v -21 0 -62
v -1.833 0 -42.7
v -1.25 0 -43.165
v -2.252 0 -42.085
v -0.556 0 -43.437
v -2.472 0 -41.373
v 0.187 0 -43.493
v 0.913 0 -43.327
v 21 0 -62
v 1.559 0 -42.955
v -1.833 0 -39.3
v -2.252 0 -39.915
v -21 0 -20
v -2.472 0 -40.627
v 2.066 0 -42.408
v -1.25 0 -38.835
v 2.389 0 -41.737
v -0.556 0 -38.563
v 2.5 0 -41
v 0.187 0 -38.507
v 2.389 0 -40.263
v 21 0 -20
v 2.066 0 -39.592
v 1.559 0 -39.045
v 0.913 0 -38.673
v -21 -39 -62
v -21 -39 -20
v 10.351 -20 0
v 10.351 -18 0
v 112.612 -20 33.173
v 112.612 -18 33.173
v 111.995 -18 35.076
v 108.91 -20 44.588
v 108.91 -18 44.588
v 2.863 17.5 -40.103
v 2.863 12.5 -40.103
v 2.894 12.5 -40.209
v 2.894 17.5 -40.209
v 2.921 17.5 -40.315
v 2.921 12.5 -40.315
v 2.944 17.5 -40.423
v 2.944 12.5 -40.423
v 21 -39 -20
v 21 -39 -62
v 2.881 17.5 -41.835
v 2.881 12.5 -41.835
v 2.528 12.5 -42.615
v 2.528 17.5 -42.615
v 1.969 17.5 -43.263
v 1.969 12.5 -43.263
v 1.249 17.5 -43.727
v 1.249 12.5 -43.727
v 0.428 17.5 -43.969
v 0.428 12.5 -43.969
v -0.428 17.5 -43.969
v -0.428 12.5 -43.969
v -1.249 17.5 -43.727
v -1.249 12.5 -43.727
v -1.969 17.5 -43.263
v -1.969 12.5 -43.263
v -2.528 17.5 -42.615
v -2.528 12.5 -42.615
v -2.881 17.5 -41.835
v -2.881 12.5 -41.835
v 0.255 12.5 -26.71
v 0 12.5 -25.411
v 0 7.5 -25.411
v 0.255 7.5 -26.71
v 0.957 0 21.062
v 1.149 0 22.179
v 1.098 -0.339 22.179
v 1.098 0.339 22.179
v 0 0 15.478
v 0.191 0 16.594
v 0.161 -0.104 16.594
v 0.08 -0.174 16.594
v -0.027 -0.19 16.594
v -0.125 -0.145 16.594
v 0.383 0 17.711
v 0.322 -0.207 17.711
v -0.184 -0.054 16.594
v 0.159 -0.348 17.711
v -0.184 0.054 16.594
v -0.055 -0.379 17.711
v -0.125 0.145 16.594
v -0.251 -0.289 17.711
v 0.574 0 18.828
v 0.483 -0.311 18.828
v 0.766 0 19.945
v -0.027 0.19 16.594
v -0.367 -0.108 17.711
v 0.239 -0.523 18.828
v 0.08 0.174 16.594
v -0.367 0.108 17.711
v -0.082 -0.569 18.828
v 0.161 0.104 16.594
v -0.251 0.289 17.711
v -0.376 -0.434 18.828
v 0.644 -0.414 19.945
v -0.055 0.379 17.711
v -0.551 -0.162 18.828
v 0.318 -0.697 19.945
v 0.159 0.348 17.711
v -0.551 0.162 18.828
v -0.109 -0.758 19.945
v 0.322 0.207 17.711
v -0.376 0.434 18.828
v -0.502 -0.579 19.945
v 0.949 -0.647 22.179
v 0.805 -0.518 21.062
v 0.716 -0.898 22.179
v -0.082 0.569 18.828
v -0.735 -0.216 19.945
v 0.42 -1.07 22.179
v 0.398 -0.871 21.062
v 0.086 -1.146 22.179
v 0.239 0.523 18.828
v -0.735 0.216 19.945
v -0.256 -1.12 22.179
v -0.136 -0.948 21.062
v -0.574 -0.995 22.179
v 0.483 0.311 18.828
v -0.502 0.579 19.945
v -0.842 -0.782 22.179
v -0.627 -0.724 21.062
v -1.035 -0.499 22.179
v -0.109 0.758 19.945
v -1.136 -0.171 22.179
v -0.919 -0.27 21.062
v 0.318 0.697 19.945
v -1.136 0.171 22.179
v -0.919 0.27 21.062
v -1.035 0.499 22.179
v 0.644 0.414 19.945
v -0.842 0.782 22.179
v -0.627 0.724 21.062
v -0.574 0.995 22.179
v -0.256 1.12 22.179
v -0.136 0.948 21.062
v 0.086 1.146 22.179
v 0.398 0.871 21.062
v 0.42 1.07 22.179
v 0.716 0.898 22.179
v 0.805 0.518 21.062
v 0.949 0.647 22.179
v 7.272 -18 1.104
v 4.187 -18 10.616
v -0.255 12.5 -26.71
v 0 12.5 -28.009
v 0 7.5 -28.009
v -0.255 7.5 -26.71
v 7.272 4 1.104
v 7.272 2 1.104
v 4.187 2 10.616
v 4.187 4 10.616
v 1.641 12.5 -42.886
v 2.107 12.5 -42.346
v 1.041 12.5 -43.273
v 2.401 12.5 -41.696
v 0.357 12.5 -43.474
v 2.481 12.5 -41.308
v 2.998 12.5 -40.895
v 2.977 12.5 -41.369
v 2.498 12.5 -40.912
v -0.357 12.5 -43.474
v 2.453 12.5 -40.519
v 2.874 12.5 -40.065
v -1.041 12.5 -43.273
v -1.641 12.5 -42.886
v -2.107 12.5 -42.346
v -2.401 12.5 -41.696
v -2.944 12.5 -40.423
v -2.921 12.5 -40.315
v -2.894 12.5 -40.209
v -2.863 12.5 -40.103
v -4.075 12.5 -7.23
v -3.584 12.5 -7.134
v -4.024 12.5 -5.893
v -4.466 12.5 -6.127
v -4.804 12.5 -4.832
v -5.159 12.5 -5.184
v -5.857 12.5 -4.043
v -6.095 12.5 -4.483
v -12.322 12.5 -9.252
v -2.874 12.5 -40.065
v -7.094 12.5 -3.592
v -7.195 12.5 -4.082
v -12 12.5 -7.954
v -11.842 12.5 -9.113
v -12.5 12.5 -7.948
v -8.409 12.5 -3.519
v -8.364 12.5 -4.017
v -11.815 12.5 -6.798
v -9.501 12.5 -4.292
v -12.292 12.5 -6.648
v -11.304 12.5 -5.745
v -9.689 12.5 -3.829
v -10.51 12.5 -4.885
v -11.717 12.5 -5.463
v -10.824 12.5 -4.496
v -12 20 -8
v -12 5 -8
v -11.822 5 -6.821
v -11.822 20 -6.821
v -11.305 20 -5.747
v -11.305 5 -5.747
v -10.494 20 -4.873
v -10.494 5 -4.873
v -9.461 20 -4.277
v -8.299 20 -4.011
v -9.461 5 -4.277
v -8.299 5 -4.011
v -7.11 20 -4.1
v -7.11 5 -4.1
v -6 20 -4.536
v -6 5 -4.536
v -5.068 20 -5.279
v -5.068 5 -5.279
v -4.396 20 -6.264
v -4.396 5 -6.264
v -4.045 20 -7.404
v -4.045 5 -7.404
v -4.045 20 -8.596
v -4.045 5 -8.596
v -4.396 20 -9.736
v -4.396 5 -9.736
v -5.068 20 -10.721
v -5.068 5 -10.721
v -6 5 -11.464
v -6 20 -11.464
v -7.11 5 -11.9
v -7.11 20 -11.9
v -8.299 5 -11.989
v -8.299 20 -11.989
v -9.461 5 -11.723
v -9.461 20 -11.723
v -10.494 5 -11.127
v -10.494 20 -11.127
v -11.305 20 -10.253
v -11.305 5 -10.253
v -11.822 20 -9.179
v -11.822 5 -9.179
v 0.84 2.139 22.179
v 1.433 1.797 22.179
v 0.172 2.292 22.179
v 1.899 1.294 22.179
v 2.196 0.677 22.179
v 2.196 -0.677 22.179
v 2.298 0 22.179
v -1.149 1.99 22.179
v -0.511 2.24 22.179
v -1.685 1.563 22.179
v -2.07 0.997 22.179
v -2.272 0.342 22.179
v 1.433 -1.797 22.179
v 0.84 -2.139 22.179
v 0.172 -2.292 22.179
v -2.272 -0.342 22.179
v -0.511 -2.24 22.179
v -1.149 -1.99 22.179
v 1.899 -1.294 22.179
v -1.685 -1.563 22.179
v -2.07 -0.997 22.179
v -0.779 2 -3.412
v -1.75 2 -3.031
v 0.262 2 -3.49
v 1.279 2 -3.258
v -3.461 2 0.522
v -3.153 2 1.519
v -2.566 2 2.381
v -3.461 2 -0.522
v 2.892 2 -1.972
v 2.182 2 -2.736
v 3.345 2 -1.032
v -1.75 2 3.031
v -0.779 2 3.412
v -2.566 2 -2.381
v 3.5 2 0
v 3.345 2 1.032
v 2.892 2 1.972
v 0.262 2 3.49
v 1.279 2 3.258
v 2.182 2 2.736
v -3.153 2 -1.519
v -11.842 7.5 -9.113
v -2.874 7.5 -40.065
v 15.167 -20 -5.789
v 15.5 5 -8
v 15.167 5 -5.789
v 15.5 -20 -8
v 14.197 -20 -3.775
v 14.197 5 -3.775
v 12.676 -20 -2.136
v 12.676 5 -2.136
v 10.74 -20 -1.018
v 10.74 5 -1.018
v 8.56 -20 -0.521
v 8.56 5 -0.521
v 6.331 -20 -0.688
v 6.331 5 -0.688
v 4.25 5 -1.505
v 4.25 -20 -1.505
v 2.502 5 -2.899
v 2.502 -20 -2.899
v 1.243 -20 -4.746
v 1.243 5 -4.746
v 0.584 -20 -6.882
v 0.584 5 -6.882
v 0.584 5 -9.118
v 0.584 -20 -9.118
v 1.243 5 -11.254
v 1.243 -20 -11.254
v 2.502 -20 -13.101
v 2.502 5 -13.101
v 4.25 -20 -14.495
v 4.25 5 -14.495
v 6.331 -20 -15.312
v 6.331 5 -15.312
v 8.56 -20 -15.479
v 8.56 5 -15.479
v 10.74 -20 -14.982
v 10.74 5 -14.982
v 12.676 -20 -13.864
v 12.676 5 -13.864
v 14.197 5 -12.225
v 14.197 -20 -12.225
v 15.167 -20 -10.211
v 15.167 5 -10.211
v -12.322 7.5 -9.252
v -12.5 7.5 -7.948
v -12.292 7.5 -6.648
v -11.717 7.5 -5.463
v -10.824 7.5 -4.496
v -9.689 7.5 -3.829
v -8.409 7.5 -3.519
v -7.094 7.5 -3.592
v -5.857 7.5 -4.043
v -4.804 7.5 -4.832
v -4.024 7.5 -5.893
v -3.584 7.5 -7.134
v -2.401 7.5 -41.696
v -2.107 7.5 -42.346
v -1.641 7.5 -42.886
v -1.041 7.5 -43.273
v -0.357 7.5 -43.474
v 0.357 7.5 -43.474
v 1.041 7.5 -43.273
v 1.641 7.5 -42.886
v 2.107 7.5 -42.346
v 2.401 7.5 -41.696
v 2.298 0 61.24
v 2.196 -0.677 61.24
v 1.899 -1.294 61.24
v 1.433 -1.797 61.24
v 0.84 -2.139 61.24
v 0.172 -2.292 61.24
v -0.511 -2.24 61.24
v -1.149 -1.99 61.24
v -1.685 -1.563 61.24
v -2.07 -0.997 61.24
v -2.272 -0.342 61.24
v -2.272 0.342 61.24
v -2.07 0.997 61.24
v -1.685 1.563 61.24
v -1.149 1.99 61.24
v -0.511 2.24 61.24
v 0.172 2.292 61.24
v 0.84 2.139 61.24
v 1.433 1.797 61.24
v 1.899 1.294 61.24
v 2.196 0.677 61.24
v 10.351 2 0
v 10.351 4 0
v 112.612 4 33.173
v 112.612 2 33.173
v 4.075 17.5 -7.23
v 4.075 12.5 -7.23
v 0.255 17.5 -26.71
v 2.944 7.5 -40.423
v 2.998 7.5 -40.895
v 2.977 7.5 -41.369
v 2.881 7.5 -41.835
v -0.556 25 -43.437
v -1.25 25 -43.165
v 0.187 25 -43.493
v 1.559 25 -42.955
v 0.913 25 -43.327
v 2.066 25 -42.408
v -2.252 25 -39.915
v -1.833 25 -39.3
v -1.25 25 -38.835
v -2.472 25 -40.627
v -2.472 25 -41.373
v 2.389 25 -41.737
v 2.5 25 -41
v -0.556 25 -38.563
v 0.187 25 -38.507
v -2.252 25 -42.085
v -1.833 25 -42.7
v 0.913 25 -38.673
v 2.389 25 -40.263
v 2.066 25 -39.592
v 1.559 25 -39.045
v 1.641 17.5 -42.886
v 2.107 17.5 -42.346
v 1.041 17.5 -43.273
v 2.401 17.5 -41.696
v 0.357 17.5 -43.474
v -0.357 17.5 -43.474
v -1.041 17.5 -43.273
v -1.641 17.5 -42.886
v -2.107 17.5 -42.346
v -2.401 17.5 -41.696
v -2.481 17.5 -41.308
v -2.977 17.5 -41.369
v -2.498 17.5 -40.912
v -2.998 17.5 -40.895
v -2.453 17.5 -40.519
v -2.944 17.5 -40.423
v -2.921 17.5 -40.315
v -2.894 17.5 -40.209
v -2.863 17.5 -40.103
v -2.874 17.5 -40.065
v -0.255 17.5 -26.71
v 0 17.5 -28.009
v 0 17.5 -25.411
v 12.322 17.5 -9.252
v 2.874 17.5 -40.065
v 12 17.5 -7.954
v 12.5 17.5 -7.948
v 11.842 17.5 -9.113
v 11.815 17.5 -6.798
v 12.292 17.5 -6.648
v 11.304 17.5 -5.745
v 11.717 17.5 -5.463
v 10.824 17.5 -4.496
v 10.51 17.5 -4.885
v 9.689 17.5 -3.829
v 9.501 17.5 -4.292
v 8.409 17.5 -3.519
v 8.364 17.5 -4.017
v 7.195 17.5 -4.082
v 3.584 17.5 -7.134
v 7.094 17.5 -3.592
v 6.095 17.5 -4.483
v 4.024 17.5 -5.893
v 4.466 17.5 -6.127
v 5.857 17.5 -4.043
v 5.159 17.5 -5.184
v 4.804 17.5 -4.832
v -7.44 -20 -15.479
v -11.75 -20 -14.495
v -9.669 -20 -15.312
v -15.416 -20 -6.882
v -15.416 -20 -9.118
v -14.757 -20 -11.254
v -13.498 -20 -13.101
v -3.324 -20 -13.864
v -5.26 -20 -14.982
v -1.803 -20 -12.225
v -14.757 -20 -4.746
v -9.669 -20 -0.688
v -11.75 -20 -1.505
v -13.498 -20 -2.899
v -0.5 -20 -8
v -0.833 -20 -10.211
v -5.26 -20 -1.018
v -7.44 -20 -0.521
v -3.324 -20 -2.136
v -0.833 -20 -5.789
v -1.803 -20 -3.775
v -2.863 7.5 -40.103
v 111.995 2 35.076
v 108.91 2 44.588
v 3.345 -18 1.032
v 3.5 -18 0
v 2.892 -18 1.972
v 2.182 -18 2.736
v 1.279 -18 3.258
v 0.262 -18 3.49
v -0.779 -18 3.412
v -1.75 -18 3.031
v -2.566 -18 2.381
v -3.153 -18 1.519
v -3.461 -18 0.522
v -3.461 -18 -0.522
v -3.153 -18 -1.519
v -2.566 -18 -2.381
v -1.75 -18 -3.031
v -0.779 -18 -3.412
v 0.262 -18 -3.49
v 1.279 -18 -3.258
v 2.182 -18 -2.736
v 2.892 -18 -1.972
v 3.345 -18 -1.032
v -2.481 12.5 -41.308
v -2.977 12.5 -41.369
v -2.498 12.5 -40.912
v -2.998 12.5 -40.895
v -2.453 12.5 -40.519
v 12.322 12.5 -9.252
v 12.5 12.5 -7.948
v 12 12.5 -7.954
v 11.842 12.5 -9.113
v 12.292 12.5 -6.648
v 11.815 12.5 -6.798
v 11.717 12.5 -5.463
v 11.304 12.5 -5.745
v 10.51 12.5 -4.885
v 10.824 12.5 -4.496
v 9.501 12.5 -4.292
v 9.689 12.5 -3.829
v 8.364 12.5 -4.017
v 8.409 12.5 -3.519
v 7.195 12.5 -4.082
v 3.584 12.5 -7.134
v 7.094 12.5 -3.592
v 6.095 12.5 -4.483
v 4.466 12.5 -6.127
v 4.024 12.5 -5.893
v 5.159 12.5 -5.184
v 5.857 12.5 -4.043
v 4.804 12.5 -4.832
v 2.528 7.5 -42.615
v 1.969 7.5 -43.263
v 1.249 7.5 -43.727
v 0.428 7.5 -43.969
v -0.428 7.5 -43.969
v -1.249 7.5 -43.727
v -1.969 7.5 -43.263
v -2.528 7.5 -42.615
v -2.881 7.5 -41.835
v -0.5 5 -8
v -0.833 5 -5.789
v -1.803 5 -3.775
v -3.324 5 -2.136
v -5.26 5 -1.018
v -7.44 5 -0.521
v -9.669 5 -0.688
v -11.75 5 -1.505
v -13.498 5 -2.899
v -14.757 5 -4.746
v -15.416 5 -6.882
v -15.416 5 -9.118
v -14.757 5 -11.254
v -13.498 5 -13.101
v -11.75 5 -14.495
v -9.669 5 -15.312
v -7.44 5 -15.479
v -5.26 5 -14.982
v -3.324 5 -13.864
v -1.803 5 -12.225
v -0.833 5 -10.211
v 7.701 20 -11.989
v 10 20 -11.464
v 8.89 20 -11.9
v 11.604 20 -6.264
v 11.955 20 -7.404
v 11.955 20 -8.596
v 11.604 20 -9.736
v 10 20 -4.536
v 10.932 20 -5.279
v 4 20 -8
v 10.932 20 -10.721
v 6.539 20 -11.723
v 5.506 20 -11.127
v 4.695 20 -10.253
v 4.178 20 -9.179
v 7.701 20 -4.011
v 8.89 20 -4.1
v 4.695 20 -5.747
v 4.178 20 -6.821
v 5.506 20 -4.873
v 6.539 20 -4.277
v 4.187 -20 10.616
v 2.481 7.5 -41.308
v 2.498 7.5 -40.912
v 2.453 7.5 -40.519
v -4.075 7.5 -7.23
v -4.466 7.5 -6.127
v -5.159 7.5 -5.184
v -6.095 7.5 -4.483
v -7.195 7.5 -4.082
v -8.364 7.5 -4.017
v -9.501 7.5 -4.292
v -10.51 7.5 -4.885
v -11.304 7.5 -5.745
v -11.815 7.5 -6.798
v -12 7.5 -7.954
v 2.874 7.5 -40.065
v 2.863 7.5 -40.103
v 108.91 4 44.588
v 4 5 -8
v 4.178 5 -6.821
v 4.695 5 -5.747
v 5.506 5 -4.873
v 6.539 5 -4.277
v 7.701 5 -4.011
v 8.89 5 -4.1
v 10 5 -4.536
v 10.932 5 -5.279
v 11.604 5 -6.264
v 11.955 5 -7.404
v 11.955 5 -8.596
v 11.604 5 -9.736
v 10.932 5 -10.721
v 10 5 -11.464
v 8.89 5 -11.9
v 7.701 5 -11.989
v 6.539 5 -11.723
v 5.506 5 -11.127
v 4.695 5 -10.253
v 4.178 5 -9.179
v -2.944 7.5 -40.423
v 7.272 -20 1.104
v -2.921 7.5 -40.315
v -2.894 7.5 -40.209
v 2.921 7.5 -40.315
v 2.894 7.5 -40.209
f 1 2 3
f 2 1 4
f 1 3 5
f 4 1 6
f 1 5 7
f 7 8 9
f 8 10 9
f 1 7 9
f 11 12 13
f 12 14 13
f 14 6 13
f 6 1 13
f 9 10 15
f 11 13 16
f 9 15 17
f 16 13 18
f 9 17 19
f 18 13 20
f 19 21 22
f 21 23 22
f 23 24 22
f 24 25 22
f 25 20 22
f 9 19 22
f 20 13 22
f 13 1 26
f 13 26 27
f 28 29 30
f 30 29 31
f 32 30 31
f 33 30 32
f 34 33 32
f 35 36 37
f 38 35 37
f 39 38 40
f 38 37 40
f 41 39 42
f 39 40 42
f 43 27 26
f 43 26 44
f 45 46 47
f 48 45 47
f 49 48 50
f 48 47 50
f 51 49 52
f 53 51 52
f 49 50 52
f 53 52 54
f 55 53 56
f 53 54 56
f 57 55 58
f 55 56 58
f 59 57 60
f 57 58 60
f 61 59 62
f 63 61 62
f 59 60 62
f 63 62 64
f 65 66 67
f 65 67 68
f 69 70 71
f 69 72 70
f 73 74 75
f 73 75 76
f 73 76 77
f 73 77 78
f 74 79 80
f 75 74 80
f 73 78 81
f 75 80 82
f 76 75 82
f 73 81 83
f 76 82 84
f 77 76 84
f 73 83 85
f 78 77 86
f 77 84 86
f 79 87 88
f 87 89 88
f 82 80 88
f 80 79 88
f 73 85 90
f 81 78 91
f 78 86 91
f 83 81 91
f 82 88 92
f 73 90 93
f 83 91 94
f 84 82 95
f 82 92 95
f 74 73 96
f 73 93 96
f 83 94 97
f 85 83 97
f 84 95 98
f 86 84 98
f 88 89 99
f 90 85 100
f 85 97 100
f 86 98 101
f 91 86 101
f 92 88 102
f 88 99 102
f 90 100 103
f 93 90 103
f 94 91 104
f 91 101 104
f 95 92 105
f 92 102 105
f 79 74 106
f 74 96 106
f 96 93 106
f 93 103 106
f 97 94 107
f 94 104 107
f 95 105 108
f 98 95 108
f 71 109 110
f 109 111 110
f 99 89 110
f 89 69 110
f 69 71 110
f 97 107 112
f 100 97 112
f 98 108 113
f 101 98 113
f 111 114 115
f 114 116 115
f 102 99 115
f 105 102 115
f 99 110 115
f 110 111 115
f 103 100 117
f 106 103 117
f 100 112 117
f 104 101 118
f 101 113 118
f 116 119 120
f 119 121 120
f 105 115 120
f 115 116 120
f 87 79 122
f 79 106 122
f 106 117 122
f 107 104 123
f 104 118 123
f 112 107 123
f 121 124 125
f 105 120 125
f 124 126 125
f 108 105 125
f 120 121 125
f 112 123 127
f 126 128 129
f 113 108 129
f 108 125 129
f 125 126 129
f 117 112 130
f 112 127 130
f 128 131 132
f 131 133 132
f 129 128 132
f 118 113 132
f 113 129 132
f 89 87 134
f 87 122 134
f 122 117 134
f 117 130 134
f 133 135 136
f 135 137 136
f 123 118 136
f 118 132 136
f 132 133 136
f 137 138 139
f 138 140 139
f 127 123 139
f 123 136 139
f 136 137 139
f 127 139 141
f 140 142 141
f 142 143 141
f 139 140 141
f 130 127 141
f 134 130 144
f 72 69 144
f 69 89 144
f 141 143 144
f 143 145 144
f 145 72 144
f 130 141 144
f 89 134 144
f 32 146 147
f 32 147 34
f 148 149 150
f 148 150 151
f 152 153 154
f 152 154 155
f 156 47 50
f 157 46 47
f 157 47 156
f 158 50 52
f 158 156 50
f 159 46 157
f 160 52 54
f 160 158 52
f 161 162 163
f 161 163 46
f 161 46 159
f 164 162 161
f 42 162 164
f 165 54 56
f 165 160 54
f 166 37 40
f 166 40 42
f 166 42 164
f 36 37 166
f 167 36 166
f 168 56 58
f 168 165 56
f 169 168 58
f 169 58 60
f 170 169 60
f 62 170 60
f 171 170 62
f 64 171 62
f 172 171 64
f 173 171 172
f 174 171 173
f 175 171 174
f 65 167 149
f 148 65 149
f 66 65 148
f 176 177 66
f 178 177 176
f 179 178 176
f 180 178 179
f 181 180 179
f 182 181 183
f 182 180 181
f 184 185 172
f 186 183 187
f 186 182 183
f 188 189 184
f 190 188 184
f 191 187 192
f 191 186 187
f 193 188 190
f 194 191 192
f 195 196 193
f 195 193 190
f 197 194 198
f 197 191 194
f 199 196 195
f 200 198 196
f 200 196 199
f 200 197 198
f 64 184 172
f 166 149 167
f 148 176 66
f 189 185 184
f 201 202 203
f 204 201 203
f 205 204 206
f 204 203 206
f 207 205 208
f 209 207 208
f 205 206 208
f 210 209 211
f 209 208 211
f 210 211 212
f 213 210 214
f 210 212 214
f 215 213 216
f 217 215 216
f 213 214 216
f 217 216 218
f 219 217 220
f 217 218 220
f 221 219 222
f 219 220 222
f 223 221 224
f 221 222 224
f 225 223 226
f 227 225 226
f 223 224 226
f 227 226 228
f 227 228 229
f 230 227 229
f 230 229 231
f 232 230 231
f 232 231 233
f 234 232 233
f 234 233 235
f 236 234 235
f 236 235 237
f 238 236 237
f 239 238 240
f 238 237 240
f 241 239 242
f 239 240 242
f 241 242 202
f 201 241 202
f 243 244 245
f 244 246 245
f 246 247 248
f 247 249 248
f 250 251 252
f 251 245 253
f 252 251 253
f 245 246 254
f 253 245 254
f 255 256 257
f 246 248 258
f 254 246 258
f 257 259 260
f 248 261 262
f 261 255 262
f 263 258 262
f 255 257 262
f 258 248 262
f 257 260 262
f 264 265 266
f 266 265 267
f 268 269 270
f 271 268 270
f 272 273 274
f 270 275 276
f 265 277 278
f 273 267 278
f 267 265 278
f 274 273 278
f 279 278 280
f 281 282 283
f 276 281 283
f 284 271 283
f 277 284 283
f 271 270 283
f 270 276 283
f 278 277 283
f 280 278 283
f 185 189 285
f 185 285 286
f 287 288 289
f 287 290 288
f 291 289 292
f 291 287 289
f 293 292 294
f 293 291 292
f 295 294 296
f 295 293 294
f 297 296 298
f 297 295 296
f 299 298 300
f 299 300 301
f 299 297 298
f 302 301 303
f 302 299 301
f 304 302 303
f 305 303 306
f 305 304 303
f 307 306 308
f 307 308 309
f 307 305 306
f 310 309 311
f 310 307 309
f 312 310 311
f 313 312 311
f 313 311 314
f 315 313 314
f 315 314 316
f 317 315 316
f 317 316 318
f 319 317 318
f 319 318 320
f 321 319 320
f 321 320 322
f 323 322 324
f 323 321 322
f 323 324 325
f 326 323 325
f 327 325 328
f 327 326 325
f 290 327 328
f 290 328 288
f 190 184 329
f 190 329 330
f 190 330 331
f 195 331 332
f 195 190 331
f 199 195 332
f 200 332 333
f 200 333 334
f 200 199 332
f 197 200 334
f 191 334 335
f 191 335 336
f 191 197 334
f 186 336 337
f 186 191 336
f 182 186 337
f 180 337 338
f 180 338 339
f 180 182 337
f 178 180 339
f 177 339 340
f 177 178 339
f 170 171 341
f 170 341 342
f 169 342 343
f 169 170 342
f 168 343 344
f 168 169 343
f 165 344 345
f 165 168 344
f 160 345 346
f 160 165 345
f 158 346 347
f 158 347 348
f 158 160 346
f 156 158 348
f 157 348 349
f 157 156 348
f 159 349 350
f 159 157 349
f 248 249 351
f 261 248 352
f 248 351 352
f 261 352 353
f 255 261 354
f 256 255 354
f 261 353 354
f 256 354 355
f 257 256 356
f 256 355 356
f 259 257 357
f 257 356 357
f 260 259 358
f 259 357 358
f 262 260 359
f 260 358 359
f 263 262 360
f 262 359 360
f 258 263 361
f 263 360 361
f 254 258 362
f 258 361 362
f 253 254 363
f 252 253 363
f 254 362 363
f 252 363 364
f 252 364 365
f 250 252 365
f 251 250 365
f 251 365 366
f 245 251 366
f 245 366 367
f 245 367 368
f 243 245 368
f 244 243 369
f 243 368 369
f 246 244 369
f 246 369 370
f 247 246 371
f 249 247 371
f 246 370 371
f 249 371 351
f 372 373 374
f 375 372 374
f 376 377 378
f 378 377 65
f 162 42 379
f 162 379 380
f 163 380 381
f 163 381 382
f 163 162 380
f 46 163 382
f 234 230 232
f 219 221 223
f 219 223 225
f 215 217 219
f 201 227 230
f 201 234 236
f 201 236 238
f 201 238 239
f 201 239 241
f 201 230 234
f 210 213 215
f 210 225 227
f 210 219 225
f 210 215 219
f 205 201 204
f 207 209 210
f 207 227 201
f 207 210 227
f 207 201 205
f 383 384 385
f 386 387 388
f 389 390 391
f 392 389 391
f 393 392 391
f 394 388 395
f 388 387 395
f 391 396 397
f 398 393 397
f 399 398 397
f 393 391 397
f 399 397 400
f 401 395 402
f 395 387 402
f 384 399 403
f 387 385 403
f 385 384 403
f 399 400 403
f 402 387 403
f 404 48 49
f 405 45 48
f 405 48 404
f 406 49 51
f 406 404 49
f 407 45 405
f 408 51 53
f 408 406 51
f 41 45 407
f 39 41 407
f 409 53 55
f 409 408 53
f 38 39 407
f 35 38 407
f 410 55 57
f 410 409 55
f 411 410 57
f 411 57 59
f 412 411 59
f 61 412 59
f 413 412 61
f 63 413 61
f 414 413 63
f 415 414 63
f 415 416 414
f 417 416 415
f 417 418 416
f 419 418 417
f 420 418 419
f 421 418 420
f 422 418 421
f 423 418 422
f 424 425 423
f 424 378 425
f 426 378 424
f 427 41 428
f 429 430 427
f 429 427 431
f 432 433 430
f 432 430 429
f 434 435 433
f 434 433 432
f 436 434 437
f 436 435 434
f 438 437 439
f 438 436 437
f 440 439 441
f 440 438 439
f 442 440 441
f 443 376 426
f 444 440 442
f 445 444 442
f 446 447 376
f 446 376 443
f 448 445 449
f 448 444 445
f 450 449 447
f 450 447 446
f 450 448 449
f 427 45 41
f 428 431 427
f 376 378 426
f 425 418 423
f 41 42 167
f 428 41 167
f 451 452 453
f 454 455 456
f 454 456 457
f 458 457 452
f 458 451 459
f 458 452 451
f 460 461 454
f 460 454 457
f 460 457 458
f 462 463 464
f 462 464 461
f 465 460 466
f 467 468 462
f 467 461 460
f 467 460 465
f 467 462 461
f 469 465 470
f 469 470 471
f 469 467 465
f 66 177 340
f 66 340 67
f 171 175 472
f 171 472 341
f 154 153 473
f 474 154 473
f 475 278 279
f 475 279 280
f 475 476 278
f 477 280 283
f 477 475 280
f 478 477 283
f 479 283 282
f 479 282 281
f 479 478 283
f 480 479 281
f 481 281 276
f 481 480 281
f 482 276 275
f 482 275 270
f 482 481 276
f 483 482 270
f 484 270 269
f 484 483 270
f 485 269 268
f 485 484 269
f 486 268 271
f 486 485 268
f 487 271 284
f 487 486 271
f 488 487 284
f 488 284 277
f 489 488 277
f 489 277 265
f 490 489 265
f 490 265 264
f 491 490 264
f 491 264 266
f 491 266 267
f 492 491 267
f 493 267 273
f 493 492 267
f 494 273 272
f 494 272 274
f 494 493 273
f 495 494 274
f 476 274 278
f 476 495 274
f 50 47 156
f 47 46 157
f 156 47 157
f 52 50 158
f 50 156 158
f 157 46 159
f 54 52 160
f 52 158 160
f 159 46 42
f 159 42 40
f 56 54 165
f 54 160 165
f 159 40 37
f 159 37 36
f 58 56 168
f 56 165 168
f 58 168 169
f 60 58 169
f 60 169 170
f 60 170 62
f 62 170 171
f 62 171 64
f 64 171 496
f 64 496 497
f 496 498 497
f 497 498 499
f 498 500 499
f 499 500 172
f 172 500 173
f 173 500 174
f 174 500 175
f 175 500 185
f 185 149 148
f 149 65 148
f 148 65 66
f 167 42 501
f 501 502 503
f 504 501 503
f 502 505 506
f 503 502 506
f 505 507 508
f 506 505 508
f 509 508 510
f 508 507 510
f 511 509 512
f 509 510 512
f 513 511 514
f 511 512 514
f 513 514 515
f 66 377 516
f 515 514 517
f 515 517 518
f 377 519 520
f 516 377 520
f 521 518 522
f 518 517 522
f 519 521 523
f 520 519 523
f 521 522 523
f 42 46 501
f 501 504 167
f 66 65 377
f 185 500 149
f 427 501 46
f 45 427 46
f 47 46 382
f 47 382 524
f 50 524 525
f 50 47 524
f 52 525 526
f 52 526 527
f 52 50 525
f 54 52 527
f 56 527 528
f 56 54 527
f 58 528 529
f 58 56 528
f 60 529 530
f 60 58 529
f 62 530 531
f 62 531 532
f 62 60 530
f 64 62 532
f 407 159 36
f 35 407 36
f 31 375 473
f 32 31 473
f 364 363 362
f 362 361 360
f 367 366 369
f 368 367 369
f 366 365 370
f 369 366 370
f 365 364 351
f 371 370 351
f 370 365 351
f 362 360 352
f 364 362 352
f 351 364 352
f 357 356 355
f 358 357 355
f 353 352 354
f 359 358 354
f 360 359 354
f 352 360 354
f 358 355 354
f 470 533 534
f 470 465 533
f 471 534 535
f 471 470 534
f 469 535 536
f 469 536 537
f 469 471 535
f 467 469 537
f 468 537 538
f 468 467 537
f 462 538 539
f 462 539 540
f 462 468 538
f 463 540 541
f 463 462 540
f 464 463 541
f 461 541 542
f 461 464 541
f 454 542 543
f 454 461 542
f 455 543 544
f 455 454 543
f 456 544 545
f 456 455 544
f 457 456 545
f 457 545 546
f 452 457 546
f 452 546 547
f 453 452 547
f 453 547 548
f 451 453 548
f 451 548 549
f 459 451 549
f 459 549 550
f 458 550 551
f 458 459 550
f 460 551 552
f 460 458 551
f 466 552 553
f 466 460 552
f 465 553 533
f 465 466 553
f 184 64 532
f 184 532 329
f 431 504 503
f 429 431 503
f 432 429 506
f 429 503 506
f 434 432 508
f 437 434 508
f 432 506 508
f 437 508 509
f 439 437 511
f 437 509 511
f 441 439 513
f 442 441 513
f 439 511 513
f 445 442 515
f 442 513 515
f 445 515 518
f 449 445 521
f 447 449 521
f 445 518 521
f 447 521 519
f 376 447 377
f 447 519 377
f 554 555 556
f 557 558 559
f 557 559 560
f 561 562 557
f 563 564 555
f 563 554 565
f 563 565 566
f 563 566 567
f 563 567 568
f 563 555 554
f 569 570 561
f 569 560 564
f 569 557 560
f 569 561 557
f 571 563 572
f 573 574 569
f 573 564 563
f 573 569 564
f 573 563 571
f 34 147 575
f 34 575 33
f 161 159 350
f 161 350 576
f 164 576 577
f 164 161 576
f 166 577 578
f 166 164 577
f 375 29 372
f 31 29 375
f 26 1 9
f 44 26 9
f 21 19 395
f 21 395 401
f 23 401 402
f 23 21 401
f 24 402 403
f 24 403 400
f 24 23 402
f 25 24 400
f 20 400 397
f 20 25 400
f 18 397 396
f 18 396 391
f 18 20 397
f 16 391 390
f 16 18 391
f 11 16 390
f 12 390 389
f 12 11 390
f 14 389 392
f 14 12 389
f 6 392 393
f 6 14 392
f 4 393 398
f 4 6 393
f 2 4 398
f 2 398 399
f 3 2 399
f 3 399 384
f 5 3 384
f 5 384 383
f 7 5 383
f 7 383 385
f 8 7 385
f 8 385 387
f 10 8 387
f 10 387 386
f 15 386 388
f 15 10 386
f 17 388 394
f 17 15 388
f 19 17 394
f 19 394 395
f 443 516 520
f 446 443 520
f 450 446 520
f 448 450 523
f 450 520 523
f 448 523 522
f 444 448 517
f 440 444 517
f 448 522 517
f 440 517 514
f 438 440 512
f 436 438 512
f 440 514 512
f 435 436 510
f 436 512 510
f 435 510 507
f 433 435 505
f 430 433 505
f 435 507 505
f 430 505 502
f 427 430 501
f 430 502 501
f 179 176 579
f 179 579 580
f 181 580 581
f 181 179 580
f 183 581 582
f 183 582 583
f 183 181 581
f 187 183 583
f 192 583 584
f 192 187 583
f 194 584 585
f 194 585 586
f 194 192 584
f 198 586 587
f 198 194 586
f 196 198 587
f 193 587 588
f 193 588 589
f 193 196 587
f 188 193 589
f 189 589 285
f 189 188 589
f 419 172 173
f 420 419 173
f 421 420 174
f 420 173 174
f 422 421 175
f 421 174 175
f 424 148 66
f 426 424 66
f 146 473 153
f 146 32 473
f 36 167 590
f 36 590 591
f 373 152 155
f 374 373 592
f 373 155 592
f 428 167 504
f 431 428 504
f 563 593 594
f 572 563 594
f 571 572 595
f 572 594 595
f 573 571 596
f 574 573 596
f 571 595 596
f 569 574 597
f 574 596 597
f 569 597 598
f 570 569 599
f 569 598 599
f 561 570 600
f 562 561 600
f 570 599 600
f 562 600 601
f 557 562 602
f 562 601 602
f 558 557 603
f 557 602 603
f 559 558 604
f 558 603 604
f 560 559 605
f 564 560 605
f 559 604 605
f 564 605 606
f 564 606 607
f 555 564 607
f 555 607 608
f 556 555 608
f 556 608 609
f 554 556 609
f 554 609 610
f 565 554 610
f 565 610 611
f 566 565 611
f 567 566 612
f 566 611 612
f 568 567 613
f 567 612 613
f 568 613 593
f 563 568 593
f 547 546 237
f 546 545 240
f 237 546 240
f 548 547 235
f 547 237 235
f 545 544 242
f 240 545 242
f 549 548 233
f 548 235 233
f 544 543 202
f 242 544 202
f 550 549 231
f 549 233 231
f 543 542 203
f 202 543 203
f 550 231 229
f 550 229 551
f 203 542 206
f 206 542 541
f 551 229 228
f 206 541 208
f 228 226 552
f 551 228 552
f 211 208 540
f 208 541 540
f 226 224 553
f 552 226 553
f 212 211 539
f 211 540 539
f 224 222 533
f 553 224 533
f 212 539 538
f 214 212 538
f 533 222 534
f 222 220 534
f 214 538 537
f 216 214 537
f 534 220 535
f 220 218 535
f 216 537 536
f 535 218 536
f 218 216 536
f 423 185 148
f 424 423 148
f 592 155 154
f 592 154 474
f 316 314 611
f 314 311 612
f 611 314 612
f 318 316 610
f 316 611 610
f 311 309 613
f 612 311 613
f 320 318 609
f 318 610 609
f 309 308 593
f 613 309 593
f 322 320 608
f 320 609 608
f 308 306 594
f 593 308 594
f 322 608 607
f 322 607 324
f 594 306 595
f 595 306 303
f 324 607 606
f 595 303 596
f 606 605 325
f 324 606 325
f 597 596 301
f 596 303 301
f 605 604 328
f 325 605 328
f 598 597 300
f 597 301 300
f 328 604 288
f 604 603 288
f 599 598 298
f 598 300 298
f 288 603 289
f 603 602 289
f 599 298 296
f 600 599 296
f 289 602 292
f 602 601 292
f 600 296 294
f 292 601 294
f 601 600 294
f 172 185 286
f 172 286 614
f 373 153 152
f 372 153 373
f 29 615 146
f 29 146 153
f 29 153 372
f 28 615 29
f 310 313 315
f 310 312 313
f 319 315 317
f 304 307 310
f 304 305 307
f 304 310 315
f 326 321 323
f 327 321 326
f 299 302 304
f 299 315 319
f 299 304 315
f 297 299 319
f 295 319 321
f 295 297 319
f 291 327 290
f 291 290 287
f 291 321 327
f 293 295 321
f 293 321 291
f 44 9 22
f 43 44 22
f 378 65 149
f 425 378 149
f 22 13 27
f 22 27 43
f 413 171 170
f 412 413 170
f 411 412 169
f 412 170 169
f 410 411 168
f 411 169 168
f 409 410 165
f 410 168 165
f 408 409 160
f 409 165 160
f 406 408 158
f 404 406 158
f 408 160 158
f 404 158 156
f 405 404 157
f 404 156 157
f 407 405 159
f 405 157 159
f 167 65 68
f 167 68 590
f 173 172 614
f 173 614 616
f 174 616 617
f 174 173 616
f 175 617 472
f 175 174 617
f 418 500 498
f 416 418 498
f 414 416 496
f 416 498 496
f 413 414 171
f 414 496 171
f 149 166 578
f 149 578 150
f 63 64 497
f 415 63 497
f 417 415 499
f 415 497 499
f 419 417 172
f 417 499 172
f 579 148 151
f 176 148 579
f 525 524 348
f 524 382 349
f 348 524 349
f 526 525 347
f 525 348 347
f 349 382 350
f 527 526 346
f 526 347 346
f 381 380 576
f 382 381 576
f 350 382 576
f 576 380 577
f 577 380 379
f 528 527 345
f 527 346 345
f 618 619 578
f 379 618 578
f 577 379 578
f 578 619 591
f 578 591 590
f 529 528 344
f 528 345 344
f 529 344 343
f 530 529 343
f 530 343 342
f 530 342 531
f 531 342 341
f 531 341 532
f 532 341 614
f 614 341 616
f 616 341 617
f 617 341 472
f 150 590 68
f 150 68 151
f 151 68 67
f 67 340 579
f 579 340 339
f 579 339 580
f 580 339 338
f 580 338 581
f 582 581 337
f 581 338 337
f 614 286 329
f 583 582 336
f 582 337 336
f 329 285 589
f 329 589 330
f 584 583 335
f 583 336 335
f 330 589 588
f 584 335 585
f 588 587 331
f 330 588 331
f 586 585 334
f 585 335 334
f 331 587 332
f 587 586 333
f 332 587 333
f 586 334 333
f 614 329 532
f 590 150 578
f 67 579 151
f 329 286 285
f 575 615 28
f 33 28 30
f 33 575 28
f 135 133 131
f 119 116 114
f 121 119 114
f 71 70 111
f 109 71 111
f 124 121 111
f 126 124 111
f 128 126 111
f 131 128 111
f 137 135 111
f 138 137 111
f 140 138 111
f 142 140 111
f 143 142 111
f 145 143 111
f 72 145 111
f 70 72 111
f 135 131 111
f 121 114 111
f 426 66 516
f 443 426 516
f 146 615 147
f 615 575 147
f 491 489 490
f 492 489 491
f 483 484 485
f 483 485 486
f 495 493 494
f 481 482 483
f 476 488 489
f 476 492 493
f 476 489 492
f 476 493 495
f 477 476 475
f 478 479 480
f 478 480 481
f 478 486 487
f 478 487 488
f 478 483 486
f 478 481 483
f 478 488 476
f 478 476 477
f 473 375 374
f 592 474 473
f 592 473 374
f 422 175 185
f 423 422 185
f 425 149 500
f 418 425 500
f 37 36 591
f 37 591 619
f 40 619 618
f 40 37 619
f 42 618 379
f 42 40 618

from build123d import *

# Parameters (mm, degrees)
F0_R           = 7.5
F1_DEPTH       = 20
F1_DEPTH_BACK  = 5
F0_W           = 42
F0_H           = 42
F0_R_2         = 2.5
F2_DEPTH       = 39
F0_R_3         = 3.5
F3_DEPTH       = 18
F3_DEPTH_BACK  = 2
F4_DEPTH       = 39
F5_DEPTH       = 25
F6_R           = 4
F7_DEPTH       = 15
F10_DEPTH      = 5
F11_DEPTH      = 5
F16_DEPTH      = 18
F16_DEPTH_BACK = 2
F17_W          = 110.0953395209
F17_H          = 2
F18_DEPTH      = 10
F18_DEPTH_BACK = 2
F19_DEPTH      = 25
F20_DEPTH      = 25


with BuildPart() as f1:
    # F0 (on Front) → F1 (new body, two sides)
    with BuildSketch(Plane.XZ) as f1_sk:
        with Locations((-8, -8)):
            Circle(F0_R)
    extrude(amount=F1_DEPTH)
    extrude(f1_sk.sketch, amount=-F1_DEPTH_BACK)

    # F6 (on face) → F7, piece 2 (join)
    with BuildSketch(Plane(origin=(0, 5, 0), x_dir=(-1, 0, 0), z_dir=(0, 1, 0))):
        with Locations((8, -8)):
            Circle(F6_R)
    extrude(amount=F7_DEPTH)


with BuildPart() as f1b:
    # F0 (on Front) → F1, piece 2 (new body, two sides)
    with BuildSketch(Plane.XZ) as f1_2_sk:
        with Locations((8, -8)):
            Circle(F0_R)
    extrude(amount=F1_DEPTH)
    extrude(f1_2_sk.sketch, amount=-F1_DEPTH_BACK)

    # F6 (on face) → F7 (join)
    with BuildSketch(Plane(origin=(0, 5, 0), x_dir=(-1, 0, 0), z_dir=(0, 1, 0))):
        with Locations((-8, -8)):
            Circle(F6_R)
    extrude(amount=F7_DEPTH)



with BuildPart() as f2:
    # F0 (on Front) → F2 (new body)
    with BuildSketch(Plane.XZ):
        with Locations((0, -41)):
            Rectangle(F0_W, F0_H)
        with Locations((0, -41)):
            Circle(F0_R_2, mode=Mode.SUBTRACT)
    extrude(amount=F2_DEPTH)

    # F0 (on Front) → F4 (join)
    with BuildSketch(Plane.XZ):
        with Locations((0, -41)):
            Circle(F0_R_2)
    extrude(amount=F4_DEPTH)

    # F0 (on Front) → F5 (join)
    with BuildSketch(Plane.XZ):
        with Locations((0, -41)):
            Circle(F0_R_2)
    extrude(amount=-F5_DEPTH)


with BuildPart() as f3:
    # F0 (on Front) → F3 (new body, two sides)
    with BuildSketch(Plane.XZ) as f3_sk:
        Circle(F0_R_3)
    extrude(amount=F3_DEPTH)
    extrude(f3_sk.sketch, amount=-F3_DEPTH_BACK)


with BuildPart() as f10:
    # F9 (on offset) → F10 (new body)
    with BuildSketch(Plane(origin=(0, 12.5, 0), x_dir=(-1, 0, 0), z_dir=(0, 1, 0))):
        with BuildLine():
            Line((0, -25.4106080933), (-3.5841093846, -7.1340265175))
            ThreePointArc((-3.5841093846, -7.1340265175), (-9.0602001153, -3.6266745244), (-12.3222219251, -9.2523568303))
            Line((-12.3222219251, -9.2523568303), (-2.8814812834, -41.8349045535))
            ThreePointArc((-2.8814812834, -41.8349045535), (-2.997071424, -41.1325250144), (-2.943927077, -40.422684345))
            Line((-2.943927077, -40.422684345), (-2.8737671883, -40.0649154294))
            Line((-2.8737671883, -40.0649154294), (-11.8419750445, -9.1132060714))
            ThreePointArc((-11.8419750445, -9.1132060714), (-8.9424001025, -4.1125995772), (-4.0747638974, -7.2302457933))
            Line((-4.0747638974, -7.2302457933), (-0.2547617452, -26.7097240855))
            Line((-0.2547617452, -26.7097240855), (0, -25.4106080933))
        make_face()
        Polygon((0.2547617452, -26.7097240855), (0, -25.4106080933), (-0.2547617452, -26.7097240855), (0, -28.0088400777), align=None)
        with BuildLine():
            Line((2.8737671883, -40.0649154294), (0.2547617452, -26.7097240855))
            Line((0.2547617452, -26.7097240855), (0, -28.0088400777))
            Line((0, -28.0088400777), (2.4532725641, -40.5189036208))
            ThreePointArc((2.4532725641, -40.5189036208), (2.4975595193, -41.110437527), (2.4012343945, -41.6957538234))
            Line((2.4012343945, -41.6957538234), (2.8627452595, -40.1029550851))
            Line((2.8627452595, -40.1029550851), (2.8737671883, -40.0649154294))
        make_face()
        with BuildLine():
            ThreePointArc((-2.943927077, -40.422684345), (-2.997071424, -41.1325250144), (-2.8814812834, -41.8349045535))
            ThreePointArc((-2.8814812834, -41.8349045535), (0, -44), (2.8814812834, -41.8349045535))
            ThreePointArc((2.8814812834, -41.8349045535), (2.997071424, -41.1325250144), (2.943927077, -40.422684345))
            ThreePointArc((2.943927077, -40.422684345), (2.9077341016, -40.2617030445), (2.8627452595, -40.1029550851))
            Line((2.8627452595, -40.1029550851), (2.4012343945, -41.6957538234))
            ThreePointArc((2.4012343945, -41.6957538234), (-1.5e-08, -43.5), (-2.4012344028, -41.6957537946))
            Line((-2.4012344028, -41.6957537946), (-2.8627452595, -40.1029550851))
            ThreePointArc((-2.8627452595, -40.1029550851), (-2.9077341016, -40.2617030445), (-2.943927077, -40.422684345))
        make_face()
    extrude(amount=F10_DEPTH)


with BuildPart() as f11:
    # F9 (on offset) → F11 (new body)
    with BuildSketch(Plane(origin=(0, 12.5, 0), x_dir=(-1, 0, 0), z_dir=(0, 1, 0))):
        with BuildLine():
            Line((3.5841093846, -7.1340265175), (0, -25.4106080933))
            Line((0, -25.4106080933), (0.2547617452, -26.7097240855))
            Line((0.2547617452, -26.7097240855), (4.0747638974, -7.2302457933))
            ThreePointArc((4.0747638974, -7.2302457933), (8.9424001025, -4.1125995772), (11.8419750445, -9.1132060714))
            Line((11.8419750445, -9.1132060714), (2.8737671883, -40.0649154294))
            Line((2.8737671883, -40.0649154294), (2.943927077, -40.422684345))
            ThreePointArc((2.943927077, -40.422684345), (2.997071424, -41.1325250144), (2.8814812834, -41.8349045535))
            Line((2.8814812834, -41.8349045535), (12.3222219251, -9.2523568303))
            ThreePointArc((12.3222219251, -9.2523568303), (9.0602001153, -3.6266745244), (3.5841093846, -7.1340265175))
        make_face()
        Polygon((0.2547617452, -26.7097240855), (0, -25.4106080933), (-0.2547617452, -26.7097240855), (0, -28.0088400777), align=None)
        with BuildLine():
            Line((0, -28.0088400777), (-0.2547617452, -26.7097240855))
            Line((-0.2547617452, -26.7097240855), (-2.8737671883, -40.0649154294))
            Line((-2.8737671883, -40.0649154294), (-2.8627452595, -40.1029550851))
            Line((-2.8627452595, -40.1029550851), (-2.4012344028, -41.6957537946))
            ThreePointArc((-2.4012344028, -41.6957537946), (-2.49755952, -41.110437512), (-2.4532725641, -40.5189036208))
            Line((-2.4532725641, -40.5189036208), (0, -28.0088400777))
        make_face()
        with BuildLine():
            ThreePointArc((-2.943927077, -40.422684345), (-2.997071424, -41.1325250144), (-2.8814812834, -41.8349045535))
            ThreePointArc((-2.8814812834, -41.8349045535), (0, -44), (2.8814812834, -41.8349045535))
            ThreePointArc((2.8814812834, -41.8349045535), (2.997071424, -41.1325250144), (2.943927077, -40.422684345))
            ThreePointArc((2.943927077, -40.422684345), (2.9077341016, -40.2617030445), (2.8627452595, -40.1029550851))
            Line((2.8627452595, -40.1029550851), (2.4012343945, -41.6957538234))
            ThreePointArc((2.4012343945, -41.6957538234), (-1.5e-08, -43.5), (-2.4012344028, -41.6957537946))
            Line((-2.4012344028, -41.6957537946), (-2.8627452595, -40.1029550851))
            ThreePointArc((-2.8627452595, -40.1029550851), (-2.9077341016, -40.2617030445), (-2.943927077, -40.422684345))
        make_face()
    extrude(amount=-F11_DEPTH)


with BuildPart() as f13:
    # F12 (on Front) → F13 (revolve)
    with BuildSketch(Plane.XZ):
        Polygon((2.2979662754, 61.23996526), (0, 61.23996526), (0, 22.1789684147), (1.1489831377, 22.1789684147), (2.2979662754, 22.1789684147), align=None)
    revolve(axis=Axis((0, 0, 39.4970257767), (0, 0, -1)))


with BuildPart() as f14:
    # F12 (on Front) → F14 (revolve)
    with BuildSketch(Plane.XZ):
        Polygon((1.1489831377, 22.1789684147), (0, 22.1789684147), (0, 15.4775185511), align=None)
    revolve(axis=Axis((0, 0, 39.4970257767), (0, 0, -1)))


with BuildPart() as f16:
    # F15 (on Front) → F16 (new body, two sides)
    with BuildSketch(Plane.XZ) as f16_sk:
        Polygon((7.2723712932, 1.1038679485), (10.3511117253, 0), (112.6124768567, 33.1732605853), (111.99534269, 35.0756657526), align=None)
    extrude(amount=F16_DEPTH)
    extrude(f16_sk.sketch, amount=-F16_DEPTH_BACK)


with BuildPart() as f1b_1:
    add(f1b.part)

    add(f16.part)  # F18 merges F16
    # F17 (on face) → F18 (join, two sides)
    with BuildSketch(Plane(origin=(0.3684329096, 0, -1.1357476363), x_dir=(0.9512025836, 0, 0.3085670833), z_dir=(-0.3085670833, 0, 0.9512025836))) as f18_sk:
        with Locations((62.3057854368, 3)):
            Rectangle(F17_W, F17_H)
        with Locations((62.3057854368, -19)):
            Rectangle(F17_W, F17_H)
    extrude(amount=F18_DEPTH)
    extrude(f18_sk.sketch, amount=-F18_DEPTH_BACK)

    # F19 (cut): a face of the model
    f19_faces = [f1b_1.faces().sort_by_distance(p)[0] for p in [
        (8.5256529061, -18, 0.1428645361),
    ]]
    extrude(f19_faces, amount=-F19_DEPTH, mode=Mode.SUBTRACT)

    # F20 (cut): a face of the model
    f20_faces = [f1b_1.faces().sort_by_distance(p)[0] for p in [
        (8.5256529061, 2, 0.1428645361),
    ]]
    extrude(f20_faces, amount=-F20_DEPTH, mode=Mode.SUBTRACT)


solid = Compound([f1.part, f2.part, f3.part, f10.part, f11.part, f13.part, f14.part, f1b_1.part])
